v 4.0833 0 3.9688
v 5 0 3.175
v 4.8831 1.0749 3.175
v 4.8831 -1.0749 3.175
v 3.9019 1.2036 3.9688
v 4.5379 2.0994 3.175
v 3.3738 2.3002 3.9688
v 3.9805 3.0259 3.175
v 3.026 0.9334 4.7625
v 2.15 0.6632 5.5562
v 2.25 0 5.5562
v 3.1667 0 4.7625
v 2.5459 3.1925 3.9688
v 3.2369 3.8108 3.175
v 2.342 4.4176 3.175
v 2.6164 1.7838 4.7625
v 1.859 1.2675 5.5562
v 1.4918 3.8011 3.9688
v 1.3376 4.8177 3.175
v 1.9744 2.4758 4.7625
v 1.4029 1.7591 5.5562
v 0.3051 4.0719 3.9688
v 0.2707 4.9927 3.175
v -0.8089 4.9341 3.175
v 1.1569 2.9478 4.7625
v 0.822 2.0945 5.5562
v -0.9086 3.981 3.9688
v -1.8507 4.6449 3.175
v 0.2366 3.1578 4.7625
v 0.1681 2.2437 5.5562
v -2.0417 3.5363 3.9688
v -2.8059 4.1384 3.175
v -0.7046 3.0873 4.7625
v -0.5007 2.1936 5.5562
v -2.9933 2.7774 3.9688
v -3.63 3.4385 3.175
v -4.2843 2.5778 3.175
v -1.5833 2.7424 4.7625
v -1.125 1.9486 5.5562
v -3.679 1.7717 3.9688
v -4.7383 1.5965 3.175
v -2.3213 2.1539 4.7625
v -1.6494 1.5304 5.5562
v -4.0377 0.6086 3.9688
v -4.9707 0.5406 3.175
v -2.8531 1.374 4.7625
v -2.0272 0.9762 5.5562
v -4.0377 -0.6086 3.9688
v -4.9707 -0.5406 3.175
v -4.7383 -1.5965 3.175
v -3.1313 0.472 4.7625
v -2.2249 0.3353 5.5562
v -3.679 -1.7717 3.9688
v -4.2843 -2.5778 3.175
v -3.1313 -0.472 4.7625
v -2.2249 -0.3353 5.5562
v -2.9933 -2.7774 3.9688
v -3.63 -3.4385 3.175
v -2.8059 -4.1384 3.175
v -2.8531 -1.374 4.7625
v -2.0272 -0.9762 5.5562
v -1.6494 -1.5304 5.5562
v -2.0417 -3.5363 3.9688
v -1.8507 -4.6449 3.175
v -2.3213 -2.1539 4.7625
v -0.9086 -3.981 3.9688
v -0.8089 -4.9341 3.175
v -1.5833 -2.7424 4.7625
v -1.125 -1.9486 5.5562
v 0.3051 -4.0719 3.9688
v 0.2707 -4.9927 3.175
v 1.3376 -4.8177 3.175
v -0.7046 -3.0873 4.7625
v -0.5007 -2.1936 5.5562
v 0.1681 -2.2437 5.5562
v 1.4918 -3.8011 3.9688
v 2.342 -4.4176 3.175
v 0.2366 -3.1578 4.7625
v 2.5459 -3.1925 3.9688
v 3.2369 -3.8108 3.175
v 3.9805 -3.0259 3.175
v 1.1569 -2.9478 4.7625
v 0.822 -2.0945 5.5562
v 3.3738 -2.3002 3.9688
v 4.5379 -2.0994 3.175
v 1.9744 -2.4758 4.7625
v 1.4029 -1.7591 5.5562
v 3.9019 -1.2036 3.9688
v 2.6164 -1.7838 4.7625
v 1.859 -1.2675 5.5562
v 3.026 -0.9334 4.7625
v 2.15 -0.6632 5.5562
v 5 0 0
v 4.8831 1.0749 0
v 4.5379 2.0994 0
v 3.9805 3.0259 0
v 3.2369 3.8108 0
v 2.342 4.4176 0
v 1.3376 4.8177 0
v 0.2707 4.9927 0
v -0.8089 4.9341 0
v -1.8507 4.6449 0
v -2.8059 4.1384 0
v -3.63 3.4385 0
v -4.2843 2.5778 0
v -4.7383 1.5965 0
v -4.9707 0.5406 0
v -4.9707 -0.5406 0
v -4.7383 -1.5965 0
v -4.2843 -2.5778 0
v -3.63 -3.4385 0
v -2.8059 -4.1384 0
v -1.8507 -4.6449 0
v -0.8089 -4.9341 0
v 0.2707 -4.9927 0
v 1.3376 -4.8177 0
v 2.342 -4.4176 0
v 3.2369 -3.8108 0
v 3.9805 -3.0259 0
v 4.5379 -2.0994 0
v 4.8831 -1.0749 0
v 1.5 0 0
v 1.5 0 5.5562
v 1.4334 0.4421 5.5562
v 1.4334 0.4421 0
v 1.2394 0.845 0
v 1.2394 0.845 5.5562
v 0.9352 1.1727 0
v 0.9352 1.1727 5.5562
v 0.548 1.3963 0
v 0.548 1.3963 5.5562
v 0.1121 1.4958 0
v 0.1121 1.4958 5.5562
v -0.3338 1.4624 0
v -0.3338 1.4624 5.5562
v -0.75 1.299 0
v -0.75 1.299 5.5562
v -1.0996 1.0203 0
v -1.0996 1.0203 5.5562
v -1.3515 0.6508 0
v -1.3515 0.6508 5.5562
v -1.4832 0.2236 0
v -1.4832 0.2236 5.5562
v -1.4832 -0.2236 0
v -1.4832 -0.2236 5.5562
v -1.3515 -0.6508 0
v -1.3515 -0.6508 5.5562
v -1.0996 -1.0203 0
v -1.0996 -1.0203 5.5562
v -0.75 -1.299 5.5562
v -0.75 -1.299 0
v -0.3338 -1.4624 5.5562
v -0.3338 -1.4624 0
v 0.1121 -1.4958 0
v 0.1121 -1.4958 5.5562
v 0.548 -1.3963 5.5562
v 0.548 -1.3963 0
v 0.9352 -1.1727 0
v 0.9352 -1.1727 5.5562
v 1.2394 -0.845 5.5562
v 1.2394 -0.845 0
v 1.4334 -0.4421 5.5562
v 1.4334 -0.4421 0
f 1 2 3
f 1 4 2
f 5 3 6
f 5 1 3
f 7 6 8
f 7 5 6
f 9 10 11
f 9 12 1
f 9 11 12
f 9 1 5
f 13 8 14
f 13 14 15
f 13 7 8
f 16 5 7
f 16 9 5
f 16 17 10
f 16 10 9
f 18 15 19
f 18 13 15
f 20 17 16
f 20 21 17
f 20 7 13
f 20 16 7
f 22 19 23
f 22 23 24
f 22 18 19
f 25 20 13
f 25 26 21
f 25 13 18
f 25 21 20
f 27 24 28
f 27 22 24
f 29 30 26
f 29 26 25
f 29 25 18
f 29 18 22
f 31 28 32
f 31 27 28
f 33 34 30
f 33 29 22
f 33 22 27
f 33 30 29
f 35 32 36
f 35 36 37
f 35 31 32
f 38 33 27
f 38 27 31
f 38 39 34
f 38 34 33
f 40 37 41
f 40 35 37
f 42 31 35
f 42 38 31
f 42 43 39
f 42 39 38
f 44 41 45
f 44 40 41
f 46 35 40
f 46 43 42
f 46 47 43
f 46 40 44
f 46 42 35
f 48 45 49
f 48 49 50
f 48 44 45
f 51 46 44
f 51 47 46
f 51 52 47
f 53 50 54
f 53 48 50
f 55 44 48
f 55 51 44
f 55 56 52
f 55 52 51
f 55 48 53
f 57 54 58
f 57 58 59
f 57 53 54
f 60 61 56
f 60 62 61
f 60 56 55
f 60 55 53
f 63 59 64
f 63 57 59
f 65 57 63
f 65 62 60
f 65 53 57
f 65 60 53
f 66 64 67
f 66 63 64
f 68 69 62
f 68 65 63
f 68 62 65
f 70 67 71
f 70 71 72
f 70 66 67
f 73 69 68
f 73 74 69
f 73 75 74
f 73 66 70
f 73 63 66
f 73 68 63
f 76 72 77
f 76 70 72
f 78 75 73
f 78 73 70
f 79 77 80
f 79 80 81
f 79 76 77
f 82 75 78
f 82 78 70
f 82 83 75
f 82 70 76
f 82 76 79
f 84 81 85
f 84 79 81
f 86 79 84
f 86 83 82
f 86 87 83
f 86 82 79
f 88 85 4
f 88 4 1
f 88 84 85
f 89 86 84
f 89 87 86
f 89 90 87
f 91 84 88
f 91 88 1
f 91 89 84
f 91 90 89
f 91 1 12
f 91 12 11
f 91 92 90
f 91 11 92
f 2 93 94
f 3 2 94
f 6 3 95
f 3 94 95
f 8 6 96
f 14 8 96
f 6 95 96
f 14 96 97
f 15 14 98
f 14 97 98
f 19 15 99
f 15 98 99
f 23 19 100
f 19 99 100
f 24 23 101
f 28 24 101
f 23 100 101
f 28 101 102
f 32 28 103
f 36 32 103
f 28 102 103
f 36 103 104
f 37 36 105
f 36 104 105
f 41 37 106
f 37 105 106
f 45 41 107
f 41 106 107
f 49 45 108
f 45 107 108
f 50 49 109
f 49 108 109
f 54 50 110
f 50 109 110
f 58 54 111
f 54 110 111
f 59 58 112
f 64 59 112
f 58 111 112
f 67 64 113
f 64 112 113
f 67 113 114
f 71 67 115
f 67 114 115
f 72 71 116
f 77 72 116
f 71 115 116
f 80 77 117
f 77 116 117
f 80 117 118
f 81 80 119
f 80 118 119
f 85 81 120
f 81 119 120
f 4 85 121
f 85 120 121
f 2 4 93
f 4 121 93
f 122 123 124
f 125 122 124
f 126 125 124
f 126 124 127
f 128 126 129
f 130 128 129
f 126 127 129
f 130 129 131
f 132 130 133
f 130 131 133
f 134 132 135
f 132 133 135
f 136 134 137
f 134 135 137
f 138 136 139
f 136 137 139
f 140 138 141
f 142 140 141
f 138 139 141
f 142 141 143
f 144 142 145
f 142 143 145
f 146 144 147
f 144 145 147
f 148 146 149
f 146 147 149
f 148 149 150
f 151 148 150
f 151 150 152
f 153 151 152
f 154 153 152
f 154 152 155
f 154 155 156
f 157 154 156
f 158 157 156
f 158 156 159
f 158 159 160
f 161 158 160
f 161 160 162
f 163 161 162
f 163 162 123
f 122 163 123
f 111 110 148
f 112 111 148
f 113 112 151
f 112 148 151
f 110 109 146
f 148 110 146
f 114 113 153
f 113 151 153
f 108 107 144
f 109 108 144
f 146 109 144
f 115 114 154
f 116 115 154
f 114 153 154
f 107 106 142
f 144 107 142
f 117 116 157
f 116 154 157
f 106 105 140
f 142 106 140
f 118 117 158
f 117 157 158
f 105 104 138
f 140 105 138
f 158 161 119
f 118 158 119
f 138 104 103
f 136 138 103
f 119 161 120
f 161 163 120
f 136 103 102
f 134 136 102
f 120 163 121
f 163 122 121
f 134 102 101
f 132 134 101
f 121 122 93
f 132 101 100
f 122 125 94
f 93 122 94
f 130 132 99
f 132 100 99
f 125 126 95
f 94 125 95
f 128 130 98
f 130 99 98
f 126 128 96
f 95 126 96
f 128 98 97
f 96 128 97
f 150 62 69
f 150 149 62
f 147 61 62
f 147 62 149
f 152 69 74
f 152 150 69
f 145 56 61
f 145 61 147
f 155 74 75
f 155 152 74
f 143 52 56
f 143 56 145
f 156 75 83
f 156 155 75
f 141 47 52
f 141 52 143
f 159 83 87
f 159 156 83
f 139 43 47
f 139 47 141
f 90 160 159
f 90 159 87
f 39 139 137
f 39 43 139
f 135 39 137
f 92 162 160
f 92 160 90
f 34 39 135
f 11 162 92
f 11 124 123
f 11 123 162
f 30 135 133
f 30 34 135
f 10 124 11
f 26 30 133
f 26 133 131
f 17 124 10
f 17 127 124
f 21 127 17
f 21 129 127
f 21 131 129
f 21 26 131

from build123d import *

# Parameters (mm, degrees)
F0_R      = 5
F2_DEPTH  = 3.175
F2_FACE_R = 5
F3_R      = 2.25
F5_R      = 1.5
F6_DEPTH  = 25.4


with BuildPart() as f2:
    # F0 (on Top) → F2 (new body)
    with BuildSketch(Plane.XY):
        Circle(F0_R)
    extrude(amount=F2_DEPTH)

    # F2_face (on face) → F4 section 0
    with BuildSketch(Plane.XY.offset(3.175)):
        Circle(F2_FACE_R)
    # F3 (on offset) → F4 section 1
    with BuildSketch(Plane.XY.offset(5.55625)):
        Circle(F3_R)
    loft()

    # F5 (on face) → F6 (cut)
    with BuildSketch(Plane.XY.offset(5.55625)):
        Circle(F5_R)
    extrude(amount=-F6_DEPTH, mode=Mode.SUBTRACT)


solid = f2.part
